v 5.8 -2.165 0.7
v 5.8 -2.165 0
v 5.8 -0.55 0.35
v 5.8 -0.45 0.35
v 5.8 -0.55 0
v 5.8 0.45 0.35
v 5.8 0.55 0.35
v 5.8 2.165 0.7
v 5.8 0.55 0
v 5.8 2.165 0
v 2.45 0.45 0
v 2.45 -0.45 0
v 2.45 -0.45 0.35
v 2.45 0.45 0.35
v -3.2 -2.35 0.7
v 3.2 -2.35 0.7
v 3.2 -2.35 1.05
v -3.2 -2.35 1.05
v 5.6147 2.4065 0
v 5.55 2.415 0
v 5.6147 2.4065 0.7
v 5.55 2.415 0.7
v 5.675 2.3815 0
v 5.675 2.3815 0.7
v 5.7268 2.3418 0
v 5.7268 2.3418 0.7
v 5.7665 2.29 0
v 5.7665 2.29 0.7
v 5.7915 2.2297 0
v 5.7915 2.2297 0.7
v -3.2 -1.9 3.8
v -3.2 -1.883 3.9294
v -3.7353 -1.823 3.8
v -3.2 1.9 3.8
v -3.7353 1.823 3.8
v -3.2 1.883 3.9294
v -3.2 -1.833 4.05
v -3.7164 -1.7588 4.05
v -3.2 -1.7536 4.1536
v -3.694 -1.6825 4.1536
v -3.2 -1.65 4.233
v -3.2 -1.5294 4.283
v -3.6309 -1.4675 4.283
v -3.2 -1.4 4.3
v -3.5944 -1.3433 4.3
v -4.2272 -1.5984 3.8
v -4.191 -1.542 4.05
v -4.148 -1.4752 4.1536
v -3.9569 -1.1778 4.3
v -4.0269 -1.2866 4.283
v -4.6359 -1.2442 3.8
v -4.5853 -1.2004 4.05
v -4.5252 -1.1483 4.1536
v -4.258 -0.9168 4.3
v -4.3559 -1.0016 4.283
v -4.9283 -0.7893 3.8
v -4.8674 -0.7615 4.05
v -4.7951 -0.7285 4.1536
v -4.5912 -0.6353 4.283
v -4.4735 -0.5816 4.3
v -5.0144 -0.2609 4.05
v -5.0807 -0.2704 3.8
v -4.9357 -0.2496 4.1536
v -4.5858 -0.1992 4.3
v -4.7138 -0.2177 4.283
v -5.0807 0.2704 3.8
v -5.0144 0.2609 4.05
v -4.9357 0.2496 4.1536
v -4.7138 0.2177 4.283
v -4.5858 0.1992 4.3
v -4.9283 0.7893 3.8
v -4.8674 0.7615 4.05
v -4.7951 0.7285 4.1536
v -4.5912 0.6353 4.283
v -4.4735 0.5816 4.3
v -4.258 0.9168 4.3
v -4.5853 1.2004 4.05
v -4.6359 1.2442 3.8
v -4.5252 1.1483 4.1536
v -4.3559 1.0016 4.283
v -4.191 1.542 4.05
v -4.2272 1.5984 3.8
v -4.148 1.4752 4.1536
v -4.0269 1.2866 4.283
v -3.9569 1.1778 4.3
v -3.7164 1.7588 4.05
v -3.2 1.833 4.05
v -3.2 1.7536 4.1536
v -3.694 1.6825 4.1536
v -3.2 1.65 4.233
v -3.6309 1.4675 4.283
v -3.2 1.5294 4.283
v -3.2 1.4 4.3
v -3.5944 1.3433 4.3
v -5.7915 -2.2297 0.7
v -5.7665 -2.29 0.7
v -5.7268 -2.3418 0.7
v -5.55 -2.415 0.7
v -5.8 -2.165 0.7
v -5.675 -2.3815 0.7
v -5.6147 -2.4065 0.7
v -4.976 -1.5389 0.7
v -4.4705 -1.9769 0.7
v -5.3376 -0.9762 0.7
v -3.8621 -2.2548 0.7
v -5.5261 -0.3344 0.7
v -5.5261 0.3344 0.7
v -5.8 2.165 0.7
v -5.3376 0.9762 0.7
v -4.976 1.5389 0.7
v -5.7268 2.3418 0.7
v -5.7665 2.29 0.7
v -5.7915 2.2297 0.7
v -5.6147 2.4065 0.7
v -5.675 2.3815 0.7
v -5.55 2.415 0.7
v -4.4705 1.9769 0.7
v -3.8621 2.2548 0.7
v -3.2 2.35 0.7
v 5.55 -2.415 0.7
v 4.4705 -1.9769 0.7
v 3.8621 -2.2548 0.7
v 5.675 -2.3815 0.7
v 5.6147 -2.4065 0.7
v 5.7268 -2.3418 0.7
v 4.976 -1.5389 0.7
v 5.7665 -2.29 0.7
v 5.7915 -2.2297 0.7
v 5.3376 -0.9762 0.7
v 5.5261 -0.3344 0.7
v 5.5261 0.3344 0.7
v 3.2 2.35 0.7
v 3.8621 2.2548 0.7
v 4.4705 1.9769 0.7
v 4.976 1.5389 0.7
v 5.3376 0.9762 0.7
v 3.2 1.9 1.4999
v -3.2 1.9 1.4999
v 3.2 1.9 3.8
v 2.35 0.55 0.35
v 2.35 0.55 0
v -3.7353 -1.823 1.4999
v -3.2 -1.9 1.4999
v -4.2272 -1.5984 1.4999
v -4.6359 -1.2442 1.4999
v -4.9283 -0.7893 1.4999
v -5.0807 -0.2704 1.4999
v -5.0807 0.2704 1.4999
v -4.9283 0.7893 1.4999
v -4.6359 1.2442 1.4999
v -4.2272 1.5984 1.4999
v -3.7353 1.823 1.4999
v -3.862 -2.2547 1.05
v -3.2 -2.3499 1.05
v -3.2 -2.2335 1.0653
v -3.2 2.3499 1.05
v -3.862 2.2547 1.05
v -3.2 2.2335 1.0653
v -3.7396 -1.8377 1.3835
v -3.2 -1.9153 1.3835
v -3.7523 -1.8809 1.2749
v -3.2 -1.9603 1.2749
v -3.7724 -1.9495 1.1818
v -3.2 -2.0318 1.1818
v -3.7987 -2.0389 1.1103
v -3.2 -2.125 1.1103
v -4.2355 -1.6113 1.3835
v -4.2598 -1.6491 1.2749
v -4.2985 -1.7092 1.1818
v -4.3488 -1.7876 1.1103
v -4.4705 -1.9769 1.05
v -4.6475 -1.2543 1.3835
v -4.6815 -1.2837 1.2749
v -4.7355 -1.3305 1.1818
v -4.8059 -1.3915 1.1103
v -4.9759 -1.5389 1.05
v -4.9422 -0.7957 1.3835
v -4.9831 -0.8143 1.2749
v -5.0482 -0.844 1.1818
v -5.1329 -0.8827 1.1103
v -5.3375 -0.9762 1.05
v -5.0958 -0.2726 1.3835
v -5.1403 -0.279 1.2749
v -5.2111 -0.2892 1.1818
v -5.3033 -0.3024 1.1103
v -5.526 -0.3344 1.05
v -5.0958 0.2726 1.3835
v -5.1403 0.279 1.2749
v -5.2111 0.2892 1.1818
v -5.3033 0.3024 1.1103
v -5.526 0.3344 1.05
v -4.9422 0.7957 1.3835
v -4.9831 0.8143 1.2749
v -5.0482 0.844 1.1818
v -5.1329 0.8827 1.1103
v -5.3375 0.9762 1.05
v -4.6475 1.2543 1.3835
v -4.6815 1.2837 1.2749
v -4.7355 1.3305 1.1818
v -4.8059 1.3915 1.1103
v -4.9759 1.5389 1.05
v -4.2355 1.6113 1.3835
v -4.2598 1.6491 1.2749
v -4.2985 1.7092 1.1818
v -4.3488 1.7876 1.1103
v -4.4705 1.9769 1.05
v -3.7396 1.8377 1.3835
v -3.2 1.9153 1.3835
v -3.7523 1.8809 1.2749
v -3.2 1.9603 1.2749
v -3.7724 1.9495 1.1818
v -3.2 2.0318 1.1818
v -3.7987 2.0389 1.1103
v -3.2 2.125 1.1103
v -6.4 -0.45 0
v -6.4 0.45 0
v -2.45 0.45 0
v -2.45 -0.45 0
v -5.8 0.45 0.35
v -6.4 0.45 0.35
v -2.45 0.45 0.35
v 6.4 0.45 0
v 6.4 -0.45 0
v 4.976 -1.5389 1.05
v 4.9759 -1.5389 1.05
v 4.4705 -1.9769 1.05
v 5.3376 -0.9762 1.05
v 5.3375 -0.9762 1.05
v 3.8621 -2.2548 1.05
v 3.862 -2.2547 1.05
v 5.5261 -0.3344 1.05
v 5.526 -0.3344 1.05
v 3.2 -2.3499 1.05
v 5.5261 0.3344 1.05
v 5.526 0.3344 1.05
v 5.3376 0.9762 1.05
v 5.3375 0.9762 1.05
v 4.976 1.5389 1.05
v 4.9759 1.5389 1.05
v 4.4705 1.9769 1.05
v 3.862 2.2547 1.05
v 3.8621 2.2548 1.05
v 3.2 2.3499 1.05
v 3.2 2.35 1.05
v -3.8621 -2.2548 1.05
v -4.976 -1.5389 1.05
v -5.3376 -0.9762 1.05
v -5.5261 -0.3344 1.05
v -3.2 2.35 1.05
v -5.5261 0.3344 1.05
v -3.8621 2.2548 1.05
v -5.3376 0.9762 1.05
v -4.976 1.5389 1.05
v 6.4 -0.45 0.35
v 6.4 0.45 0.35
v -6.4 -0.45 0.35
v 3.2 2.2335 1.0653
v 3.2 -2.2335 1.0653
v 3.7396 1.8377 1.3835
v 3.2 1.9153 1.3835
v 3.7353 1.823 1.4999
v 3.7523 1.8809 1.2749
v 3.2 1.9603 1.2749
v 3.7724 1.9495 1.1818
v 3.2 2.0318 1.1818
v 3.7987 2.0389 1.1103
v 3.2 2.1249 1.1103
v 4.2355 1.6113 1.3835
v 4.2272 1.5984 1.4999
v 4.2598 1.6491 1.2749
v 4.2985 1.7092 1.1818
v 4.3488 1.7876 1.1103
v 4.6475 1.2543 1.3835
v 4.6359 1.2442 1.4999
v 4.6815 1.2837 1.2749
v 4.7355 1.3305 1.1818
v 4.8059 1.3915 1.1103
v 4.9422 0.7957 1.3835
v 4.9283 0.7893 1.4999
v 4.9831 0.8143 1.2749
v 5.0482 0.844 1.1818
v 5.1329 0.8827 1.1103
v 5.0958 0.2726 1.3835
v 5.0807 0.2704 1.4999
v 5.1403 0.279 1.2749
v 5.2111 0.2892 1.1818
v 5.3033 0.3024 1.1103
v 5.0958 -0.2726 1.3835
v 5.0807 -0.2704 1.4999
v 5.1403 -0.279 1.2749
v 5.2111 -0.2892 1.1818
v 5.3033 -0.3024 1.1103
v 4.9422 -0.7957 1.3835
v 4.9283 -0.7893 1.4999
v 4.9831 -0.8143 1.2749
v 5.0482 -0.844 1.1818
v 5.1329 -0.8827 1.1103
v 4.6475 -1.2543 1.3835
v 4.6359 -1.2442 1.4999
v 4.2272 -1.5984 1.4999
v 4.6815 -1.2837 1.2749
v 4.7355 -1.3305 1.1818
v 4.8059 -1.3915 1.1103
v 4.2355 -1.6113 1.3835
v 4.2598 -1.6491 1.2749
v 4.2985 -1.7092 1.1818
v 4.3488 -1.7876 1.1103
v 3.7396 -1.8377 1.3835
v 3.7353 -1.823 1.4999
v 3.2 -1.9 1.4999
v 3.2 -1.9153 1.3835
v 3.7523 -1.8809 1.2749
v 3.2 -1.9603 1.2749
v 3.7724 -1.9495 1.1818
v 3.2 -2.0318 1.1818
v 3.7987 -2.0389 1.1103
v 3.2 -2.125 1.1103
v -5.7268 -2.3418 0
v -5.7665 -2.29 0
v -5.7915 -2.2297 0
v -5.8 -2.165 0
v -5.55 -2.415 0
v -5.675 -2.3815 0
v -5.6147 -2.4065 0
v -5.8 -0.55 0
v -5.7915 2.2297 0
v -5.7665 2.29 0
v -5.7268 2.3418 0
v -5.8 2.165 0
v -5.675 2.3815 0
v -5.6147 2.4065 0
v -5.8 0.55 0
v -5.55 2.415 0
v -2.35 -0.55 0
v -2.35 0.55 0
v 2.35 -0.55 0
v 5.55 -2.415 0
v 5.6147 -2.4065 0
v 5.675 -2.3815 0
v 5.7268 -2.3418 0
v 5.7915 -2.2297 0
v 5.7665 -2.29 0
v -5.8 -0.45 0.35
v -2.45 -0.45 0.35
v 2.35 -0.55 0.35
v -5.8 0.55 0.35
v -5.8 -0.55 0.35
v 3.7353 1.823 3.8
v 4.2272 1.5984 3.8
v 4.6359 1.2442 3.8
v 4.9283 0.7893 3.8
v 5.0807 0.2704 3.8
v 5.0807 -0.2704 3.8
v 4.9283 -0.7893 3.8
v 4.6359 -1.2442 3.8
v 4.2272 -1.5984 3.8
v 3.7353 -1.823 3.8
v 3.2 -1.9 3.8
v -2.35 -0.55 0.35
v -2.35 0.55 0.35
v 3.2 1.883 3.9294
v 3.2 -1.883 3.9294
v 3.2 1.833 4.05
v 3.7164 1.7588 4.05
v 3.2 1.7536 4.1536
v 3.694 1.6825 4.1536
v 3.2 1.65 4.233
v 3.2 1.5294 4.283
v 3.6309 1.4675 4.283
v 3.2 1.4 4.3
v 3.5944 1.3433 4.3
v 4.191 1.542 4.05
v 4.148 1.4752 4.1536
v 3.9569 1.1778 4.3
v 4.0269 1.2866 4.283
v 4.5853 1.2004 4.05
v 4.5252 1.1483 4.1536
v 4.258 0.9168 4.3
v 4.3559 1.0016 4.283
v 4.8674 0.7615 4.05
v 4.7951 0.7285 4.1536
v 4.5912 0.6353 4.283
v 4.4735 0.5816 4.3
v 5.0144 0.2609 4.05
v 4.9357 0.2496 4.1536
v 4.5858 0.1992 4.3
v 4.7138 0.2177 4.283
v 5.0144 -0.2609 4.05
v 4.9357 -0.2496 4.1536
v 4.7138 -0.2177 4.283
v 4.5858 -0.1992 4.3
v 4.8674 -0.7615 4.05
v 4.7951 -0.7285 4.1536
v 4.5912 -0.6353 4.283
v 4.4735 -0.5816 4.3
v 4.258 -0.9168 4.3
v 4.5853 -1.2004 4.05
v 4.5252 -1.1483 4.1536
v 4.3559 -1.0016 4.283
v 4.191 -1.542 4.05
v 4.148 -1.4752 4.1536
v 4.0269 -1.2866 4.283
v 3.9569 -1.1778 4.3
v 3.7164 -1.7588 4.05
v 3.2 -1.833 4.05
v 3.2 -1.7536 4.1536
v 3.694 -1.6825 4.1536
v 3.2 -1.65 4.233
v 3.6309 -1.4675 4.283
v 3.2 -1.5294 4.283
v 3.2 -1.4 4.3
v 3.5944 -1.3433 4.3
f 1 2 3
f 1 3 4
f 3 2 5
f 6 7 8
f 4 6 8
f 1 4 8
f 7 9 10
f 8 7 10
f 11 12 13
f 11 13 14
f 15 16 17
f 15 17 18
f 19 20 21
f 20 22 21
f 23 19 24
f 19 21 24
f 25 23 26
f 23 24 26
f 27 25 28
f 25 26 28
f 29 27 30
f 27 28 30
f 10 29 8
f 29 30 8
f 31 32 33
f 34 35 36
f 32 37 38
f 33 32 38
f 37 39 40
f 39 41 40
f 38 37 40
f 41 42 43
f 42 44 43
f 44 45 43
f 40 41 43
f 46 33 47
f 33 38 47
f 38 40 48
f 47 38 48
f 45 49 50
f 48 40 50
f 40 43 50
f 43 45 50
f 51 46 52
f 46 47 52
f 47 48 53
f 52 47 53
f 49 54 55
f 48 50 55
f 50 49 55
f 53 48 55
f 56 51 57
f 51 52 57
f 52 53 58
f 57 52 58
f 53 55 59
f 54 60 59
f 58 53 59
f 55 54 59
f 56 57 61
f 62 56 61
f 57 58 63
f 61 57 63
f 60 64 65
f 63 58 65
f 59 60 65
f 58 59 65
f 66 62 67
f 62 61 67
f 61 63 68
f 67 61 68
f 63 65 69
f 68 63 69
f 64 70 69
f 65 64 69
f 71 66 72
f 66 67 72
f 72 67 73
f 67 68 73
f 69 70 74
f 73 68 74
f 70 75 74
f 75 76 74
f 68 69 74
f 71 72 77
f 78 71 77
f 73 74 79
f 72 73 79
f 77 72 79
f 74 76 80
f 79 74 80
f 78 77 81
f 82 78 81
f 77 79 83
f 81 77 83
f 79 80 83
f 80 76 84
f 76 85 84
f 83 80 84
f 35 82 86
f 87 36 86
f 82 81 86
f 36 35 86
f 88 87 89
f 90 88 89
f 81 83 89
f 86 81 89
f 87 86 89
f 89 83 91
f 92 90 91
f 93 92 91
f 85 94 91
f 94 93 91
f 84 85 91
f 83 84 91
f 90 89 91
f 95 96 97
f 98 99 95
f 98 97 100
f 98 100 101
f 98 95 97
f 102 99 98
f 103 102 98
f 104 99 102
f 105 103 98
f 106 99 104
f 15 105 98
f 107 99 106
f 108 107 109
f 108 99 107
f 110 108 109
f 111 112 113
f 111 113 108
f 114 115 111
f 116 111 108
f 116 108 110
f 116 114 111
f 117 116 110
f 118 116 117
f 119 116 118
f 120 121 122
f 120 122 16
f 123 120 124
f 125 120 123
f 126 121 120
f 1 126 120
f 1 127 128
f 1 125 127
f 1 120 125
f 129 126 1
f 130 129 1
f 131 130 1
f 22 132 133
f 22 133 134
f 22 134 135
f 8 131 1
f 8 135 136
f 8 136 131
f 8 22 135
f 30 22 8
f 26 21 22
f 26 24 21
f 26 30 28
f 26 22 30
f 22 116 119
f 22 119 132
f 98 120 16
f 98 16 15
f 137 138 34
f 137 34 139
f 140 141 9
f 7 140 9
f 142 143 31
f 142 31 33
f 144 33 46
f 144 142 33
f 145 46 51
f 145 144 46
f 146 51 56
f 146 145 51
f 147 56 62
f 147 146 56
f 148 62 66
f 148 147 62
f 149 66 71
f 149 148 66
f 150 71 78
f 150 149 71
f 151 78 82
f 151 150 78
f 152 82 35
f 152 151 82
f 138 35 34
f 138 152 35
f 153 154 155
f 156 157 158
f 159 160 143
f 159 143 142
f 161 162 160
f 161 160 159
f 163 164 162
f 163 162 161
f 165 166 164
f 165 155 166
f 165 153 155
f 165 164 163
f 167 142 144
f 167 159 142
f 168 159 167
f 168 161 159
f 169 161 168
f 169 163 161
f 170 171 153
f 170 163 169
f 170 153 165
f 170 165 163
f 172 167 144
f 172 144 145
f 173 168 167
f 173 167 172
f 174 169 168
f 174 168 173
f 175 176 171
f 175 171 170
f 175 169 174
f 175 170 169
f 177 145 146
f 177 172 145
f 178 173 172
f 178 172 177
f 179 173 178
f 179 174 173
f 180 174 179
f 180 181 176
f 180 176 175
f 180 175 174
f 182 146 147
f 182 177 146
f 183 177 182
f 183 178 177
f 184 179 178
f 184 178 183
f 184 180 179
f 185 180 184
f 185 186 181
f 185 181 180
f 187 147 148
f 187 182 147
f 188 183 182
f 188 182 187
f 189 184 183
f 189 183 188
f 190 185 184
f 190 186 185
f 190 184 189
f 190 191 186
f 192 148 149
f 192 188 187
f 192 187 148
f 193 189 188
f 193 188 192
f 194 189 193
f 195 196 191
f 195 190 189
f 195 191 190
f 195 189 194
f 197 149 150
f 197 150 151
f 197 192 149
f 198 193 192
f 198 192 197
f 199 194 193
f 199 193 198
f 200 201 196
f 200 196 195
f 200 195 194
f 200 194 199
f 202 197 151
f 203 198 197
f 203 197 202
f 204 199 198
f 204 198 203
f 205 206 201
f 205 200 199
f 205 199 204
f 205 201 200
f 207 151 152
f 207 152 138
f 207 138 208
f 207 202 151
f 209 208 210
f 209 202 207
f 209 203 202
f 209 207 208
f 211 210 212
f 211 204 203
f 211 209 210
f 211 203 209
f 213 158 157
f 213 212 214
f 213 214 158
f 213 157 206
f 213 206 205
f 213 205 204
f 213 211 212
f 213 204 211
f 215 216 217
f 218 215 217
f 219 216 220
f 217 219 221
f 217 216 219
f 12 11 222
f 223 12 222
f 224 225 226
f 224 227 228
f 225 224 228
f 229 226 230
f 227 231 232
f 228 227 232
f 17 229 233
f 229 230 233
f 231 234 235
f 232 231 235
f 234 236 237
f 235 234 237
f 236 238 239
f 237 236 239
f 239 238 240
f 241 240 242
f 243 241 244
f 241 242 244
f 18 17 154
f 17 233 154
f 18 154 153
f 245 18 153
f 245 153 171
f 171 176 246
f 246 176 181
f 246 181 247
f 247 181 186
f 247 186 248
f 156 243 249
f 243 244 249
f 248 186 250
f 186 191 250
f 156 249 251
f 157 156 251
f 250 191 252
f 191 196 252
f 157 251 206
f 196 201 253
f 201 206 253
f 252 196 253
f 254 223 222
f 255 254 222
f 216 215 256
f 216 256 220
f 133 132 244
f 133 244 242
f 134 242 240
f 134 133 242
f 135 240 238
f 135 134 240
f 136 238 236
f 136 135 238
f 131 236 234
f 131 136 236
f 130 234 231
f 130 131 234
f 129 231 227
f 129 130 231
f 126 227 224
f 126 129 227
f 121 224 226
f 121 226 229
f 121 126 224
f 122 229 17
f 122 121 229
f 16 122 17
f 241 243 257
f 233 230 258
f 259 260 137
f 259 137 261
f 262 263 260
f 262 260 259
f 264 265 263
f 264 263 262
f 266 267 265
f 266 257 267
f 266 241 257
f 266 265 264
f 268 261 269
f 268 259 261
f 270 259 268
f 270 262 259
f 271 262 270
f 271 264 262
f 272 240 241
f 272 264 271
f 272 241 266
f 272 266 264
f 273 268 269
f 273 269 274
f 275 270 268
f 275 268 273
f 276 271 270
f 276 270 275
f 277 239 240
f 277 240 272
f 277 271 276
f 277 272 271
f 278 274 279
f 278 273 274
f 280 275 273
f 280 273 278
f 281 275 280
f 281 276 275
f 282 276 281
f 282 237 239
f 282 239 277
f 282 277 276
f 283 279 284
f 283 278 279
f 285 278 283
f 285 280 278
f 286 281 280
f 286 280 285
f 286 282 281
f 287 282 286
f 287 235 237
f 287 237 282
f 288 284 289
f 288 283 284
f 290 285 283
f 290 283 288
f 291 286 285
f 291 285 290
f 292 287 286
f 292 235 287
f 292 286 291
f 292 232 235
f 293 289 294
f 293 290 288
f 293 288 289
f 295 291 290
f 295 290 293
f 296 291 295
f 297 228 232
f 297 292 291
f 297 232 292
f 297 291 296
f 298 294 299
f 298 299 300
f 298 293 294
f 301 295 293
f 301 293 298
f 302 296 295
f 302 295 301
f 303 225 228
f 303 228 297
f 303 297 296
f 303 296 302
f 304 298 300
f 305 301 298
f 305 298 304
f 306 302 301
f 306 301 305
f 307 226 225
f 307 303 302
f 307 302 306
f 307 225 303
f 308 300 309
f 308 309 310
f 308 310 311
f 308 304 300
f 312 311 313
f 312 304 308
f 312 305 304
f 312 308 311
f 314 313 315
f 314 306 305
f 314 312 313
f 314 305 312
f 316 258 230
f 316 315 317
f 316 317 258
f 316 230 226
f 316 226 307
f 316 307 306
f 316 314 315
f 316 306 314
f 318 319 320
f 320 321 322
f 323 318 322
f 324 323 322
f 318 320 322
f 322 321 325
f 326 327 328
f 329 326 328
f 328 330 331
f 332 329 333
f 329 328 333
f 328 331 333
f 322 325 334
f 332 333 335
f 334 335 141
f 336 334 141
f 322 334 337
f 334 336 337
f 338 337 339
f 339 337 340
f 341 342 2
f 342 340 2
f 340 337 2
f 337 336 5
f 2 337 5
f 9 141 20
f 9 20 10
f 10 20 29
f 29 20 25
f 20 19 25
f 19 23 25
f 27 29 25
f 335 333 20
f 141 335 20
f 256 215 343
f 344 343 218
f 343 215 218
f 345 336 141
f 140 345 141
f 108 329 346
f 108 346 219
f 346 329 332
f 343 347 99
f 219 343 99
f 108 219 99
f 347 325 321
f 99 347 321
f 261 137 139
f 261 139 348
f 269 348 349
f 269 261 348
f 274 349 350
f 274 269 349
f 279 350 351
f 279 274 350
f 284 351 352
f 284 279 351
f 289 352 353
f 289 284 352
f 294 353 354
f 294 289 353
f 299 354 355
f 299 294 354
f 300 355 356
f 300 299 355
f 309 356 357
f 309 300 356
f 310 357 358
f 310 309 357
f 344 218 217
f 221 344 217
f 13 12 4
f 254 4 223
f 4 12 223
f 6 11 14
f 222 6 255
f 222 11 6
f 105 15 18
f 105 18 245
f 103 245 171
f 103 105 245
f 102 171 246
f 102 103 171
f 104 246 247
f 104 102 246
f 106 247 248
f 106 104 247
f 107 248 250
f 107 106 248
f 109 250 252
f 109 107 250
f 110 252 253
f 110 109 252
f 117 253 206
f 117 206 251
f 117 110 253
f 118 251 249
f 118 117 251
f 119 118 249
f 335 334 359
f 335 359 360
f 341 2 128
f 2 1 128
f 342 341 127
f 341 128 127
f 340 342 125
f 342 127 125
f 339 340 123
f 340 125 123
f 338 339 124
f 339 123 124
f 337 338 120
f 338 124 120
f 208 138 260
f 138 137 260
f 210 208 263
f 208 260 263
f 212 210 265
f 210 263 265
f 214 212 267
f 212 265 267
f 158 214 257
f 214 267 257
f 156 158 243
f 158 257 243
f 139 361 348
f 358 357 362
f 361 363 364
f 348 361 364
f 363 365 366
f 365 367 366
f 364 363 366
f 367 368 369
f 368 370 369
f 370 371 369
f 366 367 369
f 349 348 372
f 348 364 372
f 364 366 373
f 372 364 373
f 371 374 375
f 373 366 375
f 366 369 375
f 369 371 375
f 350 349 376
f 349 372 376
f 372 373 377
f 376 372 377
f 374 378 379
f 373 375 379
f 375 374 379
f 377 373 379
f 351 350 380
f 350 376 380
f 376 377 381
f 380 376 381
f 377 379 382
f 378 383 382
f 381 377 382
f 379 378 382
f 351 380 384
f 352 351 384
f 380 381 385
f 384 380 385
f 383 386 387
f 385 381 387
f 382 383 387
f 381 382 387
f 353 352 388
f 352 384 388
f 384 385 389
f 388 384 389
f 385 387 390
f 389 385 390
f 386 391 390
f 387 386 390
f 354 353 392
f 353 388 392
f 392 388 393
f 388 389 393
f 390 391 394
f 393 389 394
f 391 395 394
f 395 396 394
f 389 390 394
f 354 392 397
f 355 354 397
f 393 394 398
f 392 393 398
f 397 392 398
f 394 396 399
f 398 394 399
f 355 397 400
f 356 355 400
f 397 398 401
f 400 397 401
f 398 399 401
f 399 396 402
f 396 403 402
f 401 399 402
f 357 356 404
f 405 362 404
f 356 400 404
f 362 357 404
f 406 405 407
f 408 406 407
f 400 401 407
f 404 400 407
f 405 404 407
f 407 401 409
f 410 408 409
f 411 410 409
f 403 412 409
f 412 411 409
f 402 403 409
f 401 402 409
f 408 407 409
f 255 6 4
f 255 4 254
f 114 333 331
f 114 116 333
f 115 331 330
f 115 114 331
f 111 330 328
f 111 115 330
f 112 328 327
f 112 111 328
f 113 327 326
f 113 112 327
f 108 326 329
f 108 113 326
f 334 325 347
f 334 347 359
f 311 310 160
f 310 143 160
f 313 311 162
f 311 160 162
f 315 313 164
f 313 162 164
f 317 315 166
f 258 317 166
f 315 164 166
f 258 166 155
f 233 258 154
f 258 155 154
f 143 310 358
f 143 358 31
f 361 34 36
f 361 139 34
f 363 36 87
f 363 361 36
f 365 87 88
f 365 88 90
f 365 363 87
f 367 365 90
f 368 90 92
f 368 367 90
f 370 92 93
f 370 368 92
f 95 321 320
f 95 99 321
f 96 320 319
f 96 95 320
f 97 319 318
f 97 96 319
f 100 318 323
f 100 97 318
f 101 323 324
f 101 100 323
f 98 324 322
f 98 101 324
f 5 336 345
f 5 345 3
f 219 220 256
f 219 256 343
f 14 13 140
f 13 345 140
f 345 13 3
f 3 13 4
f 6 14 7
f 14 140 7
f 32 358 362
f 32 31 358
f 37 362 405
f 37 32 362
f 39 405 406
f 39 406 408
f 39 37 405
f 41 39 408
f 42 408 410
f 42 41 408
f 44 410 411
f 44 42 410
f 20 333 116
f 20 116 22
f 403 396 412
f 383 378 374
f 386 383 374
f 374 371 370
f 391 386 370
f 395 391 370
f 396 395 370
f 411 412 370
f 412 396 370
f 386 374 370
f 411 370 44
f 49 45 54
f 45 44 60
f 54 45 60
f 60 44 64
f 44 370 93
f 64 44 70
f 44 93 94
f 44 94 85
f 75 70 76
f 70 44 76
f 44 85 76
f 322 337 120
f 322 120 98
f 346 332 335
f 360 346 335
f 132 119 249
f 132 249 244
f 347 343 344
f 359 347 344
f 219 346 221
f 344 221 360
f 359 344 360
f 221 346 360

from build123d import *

# Parameters (mm, degrees)
SKETCH1_W           = 3.45
SKETCH1_H           = 1.1
BOSS_EXTRUDE3_DEPTH = 0.7
SKETCH1_3_W         = 3.45
SKETCH1_3_H         = 1.1
CUT_EXTRUDE1_DEPTH  = 0.35
SKETCH2_W           = 3.95
SKETCH2_H           = 0.9
BOSS_EXTRUDE4_DEPTH = 0.35
BOSS_EXTRUDE5_DEPTH = 0.35
BOSS_EXTRUDE6_DEPTH = 3.25
FILLET1_R           = 0.5
FILLET2_R           = 0.45
FILLET3_R           = 0.25


with BuildPart() as part:
    # Sketch1 → Boss-Extrude3 (new body)
    with BuildSketch(Plane.XY):
        with Locations((4.075, 0)):
            Rectangle(SKETCH1_W, SKETCH1_H)
        with Locations((-4.075, 0)):
            Rectangle(SKETCH1_W, SKETCH1_H)
        Polygon((-2.35, 0.55), (-5.8, 0.55), (-5.8, 2.415), (5.8, 2.415), (5.8, 0.55), (2.35, 0.55), (2.35, -0.55), (5.8, -0.55), (5.8, -2.415), (-5.8, -2.415), (-5.8, -0.55), (-2.35, -0.55), align=None)
    extrude(amount=BOSS_EXTRUDE3_DEPTH)

    # Sketch1<3> → Cut-Extrude1 (cut)
    with BuildSketch(Plane.XY):
        with Locations((4.075, 0)):
            Rectangle(SKETCH1_3_W, SKETCH1_3_H)
        with Locations((-4.075, 0)):
            Rectangle(SKETCH1_3_W, SKETCH1_3_H)
    extrude(amount=CUT_EXTRUDE1_DEPTH, mode=Mode.SUBTRACT)

    # Sketch2 → Boss-Extrude4 (add)
    with BuildSketch(Plane.XY):
        with Locations((4.425, 0)):
            Rectangle(SKETCH2_W, SKETCH2_H)
        with Locations((-4.425, 0)):
            Rectangle(SKETCH2_W, SKETCH2_H)
    extrude(amount=BOSS_EXTRUDE4_DEPTH)

    # Sketch3 → Boss-Extrude5 (add)
    with BuildSketch(Plane.XY.offset(0.7)):
        with BuildLine():
            Line((-3.2, 2.35), (3.2, 2.35))
            ThreePointArc((3.2, 2.35), (5.55, 0), (3.2, -2.35))
            Line((3.2, -2.35), (-3.2, -2.35))
            ThreePointArc((-3.2, -2.35), (-5.55, 0), (-3.2, 2.35))
        make_face()
    extrude(amount=BOSS_EXTRUDE5_DEPTH)

    # Sketch4 → Boss-Extrude6 (add)
    with BuildSketch(Plane.XY.offset(1.05)):
        with BuildLine():
            Line((-3.2, 1.9), (3.2, 1.9))
            ThreePointArc((3.2, 1.9), (5.1, 0), (3.2, -1.9))
            Line((3.2, -1.9), (-3.2, -1.9))
            ThreePointArc((-3.2, -1.9), (-5.1, 0), (-3.2, 1.9))
        make_face()
    extrude(amount=BOSS_EXTRUDE6_DEPTH)

    # Fillet1
    fillet1_edges = [part.edges().sort_by_distance(p)[0] for p in [
        (0, 1.9, 4.3),
        (-5.1, 0, 4.3),
        (0, -1.9, 4.3),
        (5.1, 0, 4.3),
    ]]
    fillet(fillet1_edges, radius=FILLET1_R)

    # Fillet2
    fillet2_edges = [part.edges().sort_by_distance(p)[0] for p in [
        (-5.1, 0, 1.05),
        (0, -1.9, 1.05),
        (5.1, 0, 1.05),
        (0, 1.9, 1.05),
    ]]
    fillet(fillet2_edges, radius=FILLET2_R - 0.0001)  # a hair under: the kernel refuses the full size

    # Fillet3
    fillet3_edges = [part.edges().sort_by_distance(p)[0] for p in [
        (-5.8, 2.415, 0.35),
        (5.8, 2.415, 0.35),
        (5.8, -2.415, 0.35),
        (-5.8, -2.415, 0.35),
    ]]
    fillet(fillet3_edges, radius=FILLET3_R)


solid = part.part
